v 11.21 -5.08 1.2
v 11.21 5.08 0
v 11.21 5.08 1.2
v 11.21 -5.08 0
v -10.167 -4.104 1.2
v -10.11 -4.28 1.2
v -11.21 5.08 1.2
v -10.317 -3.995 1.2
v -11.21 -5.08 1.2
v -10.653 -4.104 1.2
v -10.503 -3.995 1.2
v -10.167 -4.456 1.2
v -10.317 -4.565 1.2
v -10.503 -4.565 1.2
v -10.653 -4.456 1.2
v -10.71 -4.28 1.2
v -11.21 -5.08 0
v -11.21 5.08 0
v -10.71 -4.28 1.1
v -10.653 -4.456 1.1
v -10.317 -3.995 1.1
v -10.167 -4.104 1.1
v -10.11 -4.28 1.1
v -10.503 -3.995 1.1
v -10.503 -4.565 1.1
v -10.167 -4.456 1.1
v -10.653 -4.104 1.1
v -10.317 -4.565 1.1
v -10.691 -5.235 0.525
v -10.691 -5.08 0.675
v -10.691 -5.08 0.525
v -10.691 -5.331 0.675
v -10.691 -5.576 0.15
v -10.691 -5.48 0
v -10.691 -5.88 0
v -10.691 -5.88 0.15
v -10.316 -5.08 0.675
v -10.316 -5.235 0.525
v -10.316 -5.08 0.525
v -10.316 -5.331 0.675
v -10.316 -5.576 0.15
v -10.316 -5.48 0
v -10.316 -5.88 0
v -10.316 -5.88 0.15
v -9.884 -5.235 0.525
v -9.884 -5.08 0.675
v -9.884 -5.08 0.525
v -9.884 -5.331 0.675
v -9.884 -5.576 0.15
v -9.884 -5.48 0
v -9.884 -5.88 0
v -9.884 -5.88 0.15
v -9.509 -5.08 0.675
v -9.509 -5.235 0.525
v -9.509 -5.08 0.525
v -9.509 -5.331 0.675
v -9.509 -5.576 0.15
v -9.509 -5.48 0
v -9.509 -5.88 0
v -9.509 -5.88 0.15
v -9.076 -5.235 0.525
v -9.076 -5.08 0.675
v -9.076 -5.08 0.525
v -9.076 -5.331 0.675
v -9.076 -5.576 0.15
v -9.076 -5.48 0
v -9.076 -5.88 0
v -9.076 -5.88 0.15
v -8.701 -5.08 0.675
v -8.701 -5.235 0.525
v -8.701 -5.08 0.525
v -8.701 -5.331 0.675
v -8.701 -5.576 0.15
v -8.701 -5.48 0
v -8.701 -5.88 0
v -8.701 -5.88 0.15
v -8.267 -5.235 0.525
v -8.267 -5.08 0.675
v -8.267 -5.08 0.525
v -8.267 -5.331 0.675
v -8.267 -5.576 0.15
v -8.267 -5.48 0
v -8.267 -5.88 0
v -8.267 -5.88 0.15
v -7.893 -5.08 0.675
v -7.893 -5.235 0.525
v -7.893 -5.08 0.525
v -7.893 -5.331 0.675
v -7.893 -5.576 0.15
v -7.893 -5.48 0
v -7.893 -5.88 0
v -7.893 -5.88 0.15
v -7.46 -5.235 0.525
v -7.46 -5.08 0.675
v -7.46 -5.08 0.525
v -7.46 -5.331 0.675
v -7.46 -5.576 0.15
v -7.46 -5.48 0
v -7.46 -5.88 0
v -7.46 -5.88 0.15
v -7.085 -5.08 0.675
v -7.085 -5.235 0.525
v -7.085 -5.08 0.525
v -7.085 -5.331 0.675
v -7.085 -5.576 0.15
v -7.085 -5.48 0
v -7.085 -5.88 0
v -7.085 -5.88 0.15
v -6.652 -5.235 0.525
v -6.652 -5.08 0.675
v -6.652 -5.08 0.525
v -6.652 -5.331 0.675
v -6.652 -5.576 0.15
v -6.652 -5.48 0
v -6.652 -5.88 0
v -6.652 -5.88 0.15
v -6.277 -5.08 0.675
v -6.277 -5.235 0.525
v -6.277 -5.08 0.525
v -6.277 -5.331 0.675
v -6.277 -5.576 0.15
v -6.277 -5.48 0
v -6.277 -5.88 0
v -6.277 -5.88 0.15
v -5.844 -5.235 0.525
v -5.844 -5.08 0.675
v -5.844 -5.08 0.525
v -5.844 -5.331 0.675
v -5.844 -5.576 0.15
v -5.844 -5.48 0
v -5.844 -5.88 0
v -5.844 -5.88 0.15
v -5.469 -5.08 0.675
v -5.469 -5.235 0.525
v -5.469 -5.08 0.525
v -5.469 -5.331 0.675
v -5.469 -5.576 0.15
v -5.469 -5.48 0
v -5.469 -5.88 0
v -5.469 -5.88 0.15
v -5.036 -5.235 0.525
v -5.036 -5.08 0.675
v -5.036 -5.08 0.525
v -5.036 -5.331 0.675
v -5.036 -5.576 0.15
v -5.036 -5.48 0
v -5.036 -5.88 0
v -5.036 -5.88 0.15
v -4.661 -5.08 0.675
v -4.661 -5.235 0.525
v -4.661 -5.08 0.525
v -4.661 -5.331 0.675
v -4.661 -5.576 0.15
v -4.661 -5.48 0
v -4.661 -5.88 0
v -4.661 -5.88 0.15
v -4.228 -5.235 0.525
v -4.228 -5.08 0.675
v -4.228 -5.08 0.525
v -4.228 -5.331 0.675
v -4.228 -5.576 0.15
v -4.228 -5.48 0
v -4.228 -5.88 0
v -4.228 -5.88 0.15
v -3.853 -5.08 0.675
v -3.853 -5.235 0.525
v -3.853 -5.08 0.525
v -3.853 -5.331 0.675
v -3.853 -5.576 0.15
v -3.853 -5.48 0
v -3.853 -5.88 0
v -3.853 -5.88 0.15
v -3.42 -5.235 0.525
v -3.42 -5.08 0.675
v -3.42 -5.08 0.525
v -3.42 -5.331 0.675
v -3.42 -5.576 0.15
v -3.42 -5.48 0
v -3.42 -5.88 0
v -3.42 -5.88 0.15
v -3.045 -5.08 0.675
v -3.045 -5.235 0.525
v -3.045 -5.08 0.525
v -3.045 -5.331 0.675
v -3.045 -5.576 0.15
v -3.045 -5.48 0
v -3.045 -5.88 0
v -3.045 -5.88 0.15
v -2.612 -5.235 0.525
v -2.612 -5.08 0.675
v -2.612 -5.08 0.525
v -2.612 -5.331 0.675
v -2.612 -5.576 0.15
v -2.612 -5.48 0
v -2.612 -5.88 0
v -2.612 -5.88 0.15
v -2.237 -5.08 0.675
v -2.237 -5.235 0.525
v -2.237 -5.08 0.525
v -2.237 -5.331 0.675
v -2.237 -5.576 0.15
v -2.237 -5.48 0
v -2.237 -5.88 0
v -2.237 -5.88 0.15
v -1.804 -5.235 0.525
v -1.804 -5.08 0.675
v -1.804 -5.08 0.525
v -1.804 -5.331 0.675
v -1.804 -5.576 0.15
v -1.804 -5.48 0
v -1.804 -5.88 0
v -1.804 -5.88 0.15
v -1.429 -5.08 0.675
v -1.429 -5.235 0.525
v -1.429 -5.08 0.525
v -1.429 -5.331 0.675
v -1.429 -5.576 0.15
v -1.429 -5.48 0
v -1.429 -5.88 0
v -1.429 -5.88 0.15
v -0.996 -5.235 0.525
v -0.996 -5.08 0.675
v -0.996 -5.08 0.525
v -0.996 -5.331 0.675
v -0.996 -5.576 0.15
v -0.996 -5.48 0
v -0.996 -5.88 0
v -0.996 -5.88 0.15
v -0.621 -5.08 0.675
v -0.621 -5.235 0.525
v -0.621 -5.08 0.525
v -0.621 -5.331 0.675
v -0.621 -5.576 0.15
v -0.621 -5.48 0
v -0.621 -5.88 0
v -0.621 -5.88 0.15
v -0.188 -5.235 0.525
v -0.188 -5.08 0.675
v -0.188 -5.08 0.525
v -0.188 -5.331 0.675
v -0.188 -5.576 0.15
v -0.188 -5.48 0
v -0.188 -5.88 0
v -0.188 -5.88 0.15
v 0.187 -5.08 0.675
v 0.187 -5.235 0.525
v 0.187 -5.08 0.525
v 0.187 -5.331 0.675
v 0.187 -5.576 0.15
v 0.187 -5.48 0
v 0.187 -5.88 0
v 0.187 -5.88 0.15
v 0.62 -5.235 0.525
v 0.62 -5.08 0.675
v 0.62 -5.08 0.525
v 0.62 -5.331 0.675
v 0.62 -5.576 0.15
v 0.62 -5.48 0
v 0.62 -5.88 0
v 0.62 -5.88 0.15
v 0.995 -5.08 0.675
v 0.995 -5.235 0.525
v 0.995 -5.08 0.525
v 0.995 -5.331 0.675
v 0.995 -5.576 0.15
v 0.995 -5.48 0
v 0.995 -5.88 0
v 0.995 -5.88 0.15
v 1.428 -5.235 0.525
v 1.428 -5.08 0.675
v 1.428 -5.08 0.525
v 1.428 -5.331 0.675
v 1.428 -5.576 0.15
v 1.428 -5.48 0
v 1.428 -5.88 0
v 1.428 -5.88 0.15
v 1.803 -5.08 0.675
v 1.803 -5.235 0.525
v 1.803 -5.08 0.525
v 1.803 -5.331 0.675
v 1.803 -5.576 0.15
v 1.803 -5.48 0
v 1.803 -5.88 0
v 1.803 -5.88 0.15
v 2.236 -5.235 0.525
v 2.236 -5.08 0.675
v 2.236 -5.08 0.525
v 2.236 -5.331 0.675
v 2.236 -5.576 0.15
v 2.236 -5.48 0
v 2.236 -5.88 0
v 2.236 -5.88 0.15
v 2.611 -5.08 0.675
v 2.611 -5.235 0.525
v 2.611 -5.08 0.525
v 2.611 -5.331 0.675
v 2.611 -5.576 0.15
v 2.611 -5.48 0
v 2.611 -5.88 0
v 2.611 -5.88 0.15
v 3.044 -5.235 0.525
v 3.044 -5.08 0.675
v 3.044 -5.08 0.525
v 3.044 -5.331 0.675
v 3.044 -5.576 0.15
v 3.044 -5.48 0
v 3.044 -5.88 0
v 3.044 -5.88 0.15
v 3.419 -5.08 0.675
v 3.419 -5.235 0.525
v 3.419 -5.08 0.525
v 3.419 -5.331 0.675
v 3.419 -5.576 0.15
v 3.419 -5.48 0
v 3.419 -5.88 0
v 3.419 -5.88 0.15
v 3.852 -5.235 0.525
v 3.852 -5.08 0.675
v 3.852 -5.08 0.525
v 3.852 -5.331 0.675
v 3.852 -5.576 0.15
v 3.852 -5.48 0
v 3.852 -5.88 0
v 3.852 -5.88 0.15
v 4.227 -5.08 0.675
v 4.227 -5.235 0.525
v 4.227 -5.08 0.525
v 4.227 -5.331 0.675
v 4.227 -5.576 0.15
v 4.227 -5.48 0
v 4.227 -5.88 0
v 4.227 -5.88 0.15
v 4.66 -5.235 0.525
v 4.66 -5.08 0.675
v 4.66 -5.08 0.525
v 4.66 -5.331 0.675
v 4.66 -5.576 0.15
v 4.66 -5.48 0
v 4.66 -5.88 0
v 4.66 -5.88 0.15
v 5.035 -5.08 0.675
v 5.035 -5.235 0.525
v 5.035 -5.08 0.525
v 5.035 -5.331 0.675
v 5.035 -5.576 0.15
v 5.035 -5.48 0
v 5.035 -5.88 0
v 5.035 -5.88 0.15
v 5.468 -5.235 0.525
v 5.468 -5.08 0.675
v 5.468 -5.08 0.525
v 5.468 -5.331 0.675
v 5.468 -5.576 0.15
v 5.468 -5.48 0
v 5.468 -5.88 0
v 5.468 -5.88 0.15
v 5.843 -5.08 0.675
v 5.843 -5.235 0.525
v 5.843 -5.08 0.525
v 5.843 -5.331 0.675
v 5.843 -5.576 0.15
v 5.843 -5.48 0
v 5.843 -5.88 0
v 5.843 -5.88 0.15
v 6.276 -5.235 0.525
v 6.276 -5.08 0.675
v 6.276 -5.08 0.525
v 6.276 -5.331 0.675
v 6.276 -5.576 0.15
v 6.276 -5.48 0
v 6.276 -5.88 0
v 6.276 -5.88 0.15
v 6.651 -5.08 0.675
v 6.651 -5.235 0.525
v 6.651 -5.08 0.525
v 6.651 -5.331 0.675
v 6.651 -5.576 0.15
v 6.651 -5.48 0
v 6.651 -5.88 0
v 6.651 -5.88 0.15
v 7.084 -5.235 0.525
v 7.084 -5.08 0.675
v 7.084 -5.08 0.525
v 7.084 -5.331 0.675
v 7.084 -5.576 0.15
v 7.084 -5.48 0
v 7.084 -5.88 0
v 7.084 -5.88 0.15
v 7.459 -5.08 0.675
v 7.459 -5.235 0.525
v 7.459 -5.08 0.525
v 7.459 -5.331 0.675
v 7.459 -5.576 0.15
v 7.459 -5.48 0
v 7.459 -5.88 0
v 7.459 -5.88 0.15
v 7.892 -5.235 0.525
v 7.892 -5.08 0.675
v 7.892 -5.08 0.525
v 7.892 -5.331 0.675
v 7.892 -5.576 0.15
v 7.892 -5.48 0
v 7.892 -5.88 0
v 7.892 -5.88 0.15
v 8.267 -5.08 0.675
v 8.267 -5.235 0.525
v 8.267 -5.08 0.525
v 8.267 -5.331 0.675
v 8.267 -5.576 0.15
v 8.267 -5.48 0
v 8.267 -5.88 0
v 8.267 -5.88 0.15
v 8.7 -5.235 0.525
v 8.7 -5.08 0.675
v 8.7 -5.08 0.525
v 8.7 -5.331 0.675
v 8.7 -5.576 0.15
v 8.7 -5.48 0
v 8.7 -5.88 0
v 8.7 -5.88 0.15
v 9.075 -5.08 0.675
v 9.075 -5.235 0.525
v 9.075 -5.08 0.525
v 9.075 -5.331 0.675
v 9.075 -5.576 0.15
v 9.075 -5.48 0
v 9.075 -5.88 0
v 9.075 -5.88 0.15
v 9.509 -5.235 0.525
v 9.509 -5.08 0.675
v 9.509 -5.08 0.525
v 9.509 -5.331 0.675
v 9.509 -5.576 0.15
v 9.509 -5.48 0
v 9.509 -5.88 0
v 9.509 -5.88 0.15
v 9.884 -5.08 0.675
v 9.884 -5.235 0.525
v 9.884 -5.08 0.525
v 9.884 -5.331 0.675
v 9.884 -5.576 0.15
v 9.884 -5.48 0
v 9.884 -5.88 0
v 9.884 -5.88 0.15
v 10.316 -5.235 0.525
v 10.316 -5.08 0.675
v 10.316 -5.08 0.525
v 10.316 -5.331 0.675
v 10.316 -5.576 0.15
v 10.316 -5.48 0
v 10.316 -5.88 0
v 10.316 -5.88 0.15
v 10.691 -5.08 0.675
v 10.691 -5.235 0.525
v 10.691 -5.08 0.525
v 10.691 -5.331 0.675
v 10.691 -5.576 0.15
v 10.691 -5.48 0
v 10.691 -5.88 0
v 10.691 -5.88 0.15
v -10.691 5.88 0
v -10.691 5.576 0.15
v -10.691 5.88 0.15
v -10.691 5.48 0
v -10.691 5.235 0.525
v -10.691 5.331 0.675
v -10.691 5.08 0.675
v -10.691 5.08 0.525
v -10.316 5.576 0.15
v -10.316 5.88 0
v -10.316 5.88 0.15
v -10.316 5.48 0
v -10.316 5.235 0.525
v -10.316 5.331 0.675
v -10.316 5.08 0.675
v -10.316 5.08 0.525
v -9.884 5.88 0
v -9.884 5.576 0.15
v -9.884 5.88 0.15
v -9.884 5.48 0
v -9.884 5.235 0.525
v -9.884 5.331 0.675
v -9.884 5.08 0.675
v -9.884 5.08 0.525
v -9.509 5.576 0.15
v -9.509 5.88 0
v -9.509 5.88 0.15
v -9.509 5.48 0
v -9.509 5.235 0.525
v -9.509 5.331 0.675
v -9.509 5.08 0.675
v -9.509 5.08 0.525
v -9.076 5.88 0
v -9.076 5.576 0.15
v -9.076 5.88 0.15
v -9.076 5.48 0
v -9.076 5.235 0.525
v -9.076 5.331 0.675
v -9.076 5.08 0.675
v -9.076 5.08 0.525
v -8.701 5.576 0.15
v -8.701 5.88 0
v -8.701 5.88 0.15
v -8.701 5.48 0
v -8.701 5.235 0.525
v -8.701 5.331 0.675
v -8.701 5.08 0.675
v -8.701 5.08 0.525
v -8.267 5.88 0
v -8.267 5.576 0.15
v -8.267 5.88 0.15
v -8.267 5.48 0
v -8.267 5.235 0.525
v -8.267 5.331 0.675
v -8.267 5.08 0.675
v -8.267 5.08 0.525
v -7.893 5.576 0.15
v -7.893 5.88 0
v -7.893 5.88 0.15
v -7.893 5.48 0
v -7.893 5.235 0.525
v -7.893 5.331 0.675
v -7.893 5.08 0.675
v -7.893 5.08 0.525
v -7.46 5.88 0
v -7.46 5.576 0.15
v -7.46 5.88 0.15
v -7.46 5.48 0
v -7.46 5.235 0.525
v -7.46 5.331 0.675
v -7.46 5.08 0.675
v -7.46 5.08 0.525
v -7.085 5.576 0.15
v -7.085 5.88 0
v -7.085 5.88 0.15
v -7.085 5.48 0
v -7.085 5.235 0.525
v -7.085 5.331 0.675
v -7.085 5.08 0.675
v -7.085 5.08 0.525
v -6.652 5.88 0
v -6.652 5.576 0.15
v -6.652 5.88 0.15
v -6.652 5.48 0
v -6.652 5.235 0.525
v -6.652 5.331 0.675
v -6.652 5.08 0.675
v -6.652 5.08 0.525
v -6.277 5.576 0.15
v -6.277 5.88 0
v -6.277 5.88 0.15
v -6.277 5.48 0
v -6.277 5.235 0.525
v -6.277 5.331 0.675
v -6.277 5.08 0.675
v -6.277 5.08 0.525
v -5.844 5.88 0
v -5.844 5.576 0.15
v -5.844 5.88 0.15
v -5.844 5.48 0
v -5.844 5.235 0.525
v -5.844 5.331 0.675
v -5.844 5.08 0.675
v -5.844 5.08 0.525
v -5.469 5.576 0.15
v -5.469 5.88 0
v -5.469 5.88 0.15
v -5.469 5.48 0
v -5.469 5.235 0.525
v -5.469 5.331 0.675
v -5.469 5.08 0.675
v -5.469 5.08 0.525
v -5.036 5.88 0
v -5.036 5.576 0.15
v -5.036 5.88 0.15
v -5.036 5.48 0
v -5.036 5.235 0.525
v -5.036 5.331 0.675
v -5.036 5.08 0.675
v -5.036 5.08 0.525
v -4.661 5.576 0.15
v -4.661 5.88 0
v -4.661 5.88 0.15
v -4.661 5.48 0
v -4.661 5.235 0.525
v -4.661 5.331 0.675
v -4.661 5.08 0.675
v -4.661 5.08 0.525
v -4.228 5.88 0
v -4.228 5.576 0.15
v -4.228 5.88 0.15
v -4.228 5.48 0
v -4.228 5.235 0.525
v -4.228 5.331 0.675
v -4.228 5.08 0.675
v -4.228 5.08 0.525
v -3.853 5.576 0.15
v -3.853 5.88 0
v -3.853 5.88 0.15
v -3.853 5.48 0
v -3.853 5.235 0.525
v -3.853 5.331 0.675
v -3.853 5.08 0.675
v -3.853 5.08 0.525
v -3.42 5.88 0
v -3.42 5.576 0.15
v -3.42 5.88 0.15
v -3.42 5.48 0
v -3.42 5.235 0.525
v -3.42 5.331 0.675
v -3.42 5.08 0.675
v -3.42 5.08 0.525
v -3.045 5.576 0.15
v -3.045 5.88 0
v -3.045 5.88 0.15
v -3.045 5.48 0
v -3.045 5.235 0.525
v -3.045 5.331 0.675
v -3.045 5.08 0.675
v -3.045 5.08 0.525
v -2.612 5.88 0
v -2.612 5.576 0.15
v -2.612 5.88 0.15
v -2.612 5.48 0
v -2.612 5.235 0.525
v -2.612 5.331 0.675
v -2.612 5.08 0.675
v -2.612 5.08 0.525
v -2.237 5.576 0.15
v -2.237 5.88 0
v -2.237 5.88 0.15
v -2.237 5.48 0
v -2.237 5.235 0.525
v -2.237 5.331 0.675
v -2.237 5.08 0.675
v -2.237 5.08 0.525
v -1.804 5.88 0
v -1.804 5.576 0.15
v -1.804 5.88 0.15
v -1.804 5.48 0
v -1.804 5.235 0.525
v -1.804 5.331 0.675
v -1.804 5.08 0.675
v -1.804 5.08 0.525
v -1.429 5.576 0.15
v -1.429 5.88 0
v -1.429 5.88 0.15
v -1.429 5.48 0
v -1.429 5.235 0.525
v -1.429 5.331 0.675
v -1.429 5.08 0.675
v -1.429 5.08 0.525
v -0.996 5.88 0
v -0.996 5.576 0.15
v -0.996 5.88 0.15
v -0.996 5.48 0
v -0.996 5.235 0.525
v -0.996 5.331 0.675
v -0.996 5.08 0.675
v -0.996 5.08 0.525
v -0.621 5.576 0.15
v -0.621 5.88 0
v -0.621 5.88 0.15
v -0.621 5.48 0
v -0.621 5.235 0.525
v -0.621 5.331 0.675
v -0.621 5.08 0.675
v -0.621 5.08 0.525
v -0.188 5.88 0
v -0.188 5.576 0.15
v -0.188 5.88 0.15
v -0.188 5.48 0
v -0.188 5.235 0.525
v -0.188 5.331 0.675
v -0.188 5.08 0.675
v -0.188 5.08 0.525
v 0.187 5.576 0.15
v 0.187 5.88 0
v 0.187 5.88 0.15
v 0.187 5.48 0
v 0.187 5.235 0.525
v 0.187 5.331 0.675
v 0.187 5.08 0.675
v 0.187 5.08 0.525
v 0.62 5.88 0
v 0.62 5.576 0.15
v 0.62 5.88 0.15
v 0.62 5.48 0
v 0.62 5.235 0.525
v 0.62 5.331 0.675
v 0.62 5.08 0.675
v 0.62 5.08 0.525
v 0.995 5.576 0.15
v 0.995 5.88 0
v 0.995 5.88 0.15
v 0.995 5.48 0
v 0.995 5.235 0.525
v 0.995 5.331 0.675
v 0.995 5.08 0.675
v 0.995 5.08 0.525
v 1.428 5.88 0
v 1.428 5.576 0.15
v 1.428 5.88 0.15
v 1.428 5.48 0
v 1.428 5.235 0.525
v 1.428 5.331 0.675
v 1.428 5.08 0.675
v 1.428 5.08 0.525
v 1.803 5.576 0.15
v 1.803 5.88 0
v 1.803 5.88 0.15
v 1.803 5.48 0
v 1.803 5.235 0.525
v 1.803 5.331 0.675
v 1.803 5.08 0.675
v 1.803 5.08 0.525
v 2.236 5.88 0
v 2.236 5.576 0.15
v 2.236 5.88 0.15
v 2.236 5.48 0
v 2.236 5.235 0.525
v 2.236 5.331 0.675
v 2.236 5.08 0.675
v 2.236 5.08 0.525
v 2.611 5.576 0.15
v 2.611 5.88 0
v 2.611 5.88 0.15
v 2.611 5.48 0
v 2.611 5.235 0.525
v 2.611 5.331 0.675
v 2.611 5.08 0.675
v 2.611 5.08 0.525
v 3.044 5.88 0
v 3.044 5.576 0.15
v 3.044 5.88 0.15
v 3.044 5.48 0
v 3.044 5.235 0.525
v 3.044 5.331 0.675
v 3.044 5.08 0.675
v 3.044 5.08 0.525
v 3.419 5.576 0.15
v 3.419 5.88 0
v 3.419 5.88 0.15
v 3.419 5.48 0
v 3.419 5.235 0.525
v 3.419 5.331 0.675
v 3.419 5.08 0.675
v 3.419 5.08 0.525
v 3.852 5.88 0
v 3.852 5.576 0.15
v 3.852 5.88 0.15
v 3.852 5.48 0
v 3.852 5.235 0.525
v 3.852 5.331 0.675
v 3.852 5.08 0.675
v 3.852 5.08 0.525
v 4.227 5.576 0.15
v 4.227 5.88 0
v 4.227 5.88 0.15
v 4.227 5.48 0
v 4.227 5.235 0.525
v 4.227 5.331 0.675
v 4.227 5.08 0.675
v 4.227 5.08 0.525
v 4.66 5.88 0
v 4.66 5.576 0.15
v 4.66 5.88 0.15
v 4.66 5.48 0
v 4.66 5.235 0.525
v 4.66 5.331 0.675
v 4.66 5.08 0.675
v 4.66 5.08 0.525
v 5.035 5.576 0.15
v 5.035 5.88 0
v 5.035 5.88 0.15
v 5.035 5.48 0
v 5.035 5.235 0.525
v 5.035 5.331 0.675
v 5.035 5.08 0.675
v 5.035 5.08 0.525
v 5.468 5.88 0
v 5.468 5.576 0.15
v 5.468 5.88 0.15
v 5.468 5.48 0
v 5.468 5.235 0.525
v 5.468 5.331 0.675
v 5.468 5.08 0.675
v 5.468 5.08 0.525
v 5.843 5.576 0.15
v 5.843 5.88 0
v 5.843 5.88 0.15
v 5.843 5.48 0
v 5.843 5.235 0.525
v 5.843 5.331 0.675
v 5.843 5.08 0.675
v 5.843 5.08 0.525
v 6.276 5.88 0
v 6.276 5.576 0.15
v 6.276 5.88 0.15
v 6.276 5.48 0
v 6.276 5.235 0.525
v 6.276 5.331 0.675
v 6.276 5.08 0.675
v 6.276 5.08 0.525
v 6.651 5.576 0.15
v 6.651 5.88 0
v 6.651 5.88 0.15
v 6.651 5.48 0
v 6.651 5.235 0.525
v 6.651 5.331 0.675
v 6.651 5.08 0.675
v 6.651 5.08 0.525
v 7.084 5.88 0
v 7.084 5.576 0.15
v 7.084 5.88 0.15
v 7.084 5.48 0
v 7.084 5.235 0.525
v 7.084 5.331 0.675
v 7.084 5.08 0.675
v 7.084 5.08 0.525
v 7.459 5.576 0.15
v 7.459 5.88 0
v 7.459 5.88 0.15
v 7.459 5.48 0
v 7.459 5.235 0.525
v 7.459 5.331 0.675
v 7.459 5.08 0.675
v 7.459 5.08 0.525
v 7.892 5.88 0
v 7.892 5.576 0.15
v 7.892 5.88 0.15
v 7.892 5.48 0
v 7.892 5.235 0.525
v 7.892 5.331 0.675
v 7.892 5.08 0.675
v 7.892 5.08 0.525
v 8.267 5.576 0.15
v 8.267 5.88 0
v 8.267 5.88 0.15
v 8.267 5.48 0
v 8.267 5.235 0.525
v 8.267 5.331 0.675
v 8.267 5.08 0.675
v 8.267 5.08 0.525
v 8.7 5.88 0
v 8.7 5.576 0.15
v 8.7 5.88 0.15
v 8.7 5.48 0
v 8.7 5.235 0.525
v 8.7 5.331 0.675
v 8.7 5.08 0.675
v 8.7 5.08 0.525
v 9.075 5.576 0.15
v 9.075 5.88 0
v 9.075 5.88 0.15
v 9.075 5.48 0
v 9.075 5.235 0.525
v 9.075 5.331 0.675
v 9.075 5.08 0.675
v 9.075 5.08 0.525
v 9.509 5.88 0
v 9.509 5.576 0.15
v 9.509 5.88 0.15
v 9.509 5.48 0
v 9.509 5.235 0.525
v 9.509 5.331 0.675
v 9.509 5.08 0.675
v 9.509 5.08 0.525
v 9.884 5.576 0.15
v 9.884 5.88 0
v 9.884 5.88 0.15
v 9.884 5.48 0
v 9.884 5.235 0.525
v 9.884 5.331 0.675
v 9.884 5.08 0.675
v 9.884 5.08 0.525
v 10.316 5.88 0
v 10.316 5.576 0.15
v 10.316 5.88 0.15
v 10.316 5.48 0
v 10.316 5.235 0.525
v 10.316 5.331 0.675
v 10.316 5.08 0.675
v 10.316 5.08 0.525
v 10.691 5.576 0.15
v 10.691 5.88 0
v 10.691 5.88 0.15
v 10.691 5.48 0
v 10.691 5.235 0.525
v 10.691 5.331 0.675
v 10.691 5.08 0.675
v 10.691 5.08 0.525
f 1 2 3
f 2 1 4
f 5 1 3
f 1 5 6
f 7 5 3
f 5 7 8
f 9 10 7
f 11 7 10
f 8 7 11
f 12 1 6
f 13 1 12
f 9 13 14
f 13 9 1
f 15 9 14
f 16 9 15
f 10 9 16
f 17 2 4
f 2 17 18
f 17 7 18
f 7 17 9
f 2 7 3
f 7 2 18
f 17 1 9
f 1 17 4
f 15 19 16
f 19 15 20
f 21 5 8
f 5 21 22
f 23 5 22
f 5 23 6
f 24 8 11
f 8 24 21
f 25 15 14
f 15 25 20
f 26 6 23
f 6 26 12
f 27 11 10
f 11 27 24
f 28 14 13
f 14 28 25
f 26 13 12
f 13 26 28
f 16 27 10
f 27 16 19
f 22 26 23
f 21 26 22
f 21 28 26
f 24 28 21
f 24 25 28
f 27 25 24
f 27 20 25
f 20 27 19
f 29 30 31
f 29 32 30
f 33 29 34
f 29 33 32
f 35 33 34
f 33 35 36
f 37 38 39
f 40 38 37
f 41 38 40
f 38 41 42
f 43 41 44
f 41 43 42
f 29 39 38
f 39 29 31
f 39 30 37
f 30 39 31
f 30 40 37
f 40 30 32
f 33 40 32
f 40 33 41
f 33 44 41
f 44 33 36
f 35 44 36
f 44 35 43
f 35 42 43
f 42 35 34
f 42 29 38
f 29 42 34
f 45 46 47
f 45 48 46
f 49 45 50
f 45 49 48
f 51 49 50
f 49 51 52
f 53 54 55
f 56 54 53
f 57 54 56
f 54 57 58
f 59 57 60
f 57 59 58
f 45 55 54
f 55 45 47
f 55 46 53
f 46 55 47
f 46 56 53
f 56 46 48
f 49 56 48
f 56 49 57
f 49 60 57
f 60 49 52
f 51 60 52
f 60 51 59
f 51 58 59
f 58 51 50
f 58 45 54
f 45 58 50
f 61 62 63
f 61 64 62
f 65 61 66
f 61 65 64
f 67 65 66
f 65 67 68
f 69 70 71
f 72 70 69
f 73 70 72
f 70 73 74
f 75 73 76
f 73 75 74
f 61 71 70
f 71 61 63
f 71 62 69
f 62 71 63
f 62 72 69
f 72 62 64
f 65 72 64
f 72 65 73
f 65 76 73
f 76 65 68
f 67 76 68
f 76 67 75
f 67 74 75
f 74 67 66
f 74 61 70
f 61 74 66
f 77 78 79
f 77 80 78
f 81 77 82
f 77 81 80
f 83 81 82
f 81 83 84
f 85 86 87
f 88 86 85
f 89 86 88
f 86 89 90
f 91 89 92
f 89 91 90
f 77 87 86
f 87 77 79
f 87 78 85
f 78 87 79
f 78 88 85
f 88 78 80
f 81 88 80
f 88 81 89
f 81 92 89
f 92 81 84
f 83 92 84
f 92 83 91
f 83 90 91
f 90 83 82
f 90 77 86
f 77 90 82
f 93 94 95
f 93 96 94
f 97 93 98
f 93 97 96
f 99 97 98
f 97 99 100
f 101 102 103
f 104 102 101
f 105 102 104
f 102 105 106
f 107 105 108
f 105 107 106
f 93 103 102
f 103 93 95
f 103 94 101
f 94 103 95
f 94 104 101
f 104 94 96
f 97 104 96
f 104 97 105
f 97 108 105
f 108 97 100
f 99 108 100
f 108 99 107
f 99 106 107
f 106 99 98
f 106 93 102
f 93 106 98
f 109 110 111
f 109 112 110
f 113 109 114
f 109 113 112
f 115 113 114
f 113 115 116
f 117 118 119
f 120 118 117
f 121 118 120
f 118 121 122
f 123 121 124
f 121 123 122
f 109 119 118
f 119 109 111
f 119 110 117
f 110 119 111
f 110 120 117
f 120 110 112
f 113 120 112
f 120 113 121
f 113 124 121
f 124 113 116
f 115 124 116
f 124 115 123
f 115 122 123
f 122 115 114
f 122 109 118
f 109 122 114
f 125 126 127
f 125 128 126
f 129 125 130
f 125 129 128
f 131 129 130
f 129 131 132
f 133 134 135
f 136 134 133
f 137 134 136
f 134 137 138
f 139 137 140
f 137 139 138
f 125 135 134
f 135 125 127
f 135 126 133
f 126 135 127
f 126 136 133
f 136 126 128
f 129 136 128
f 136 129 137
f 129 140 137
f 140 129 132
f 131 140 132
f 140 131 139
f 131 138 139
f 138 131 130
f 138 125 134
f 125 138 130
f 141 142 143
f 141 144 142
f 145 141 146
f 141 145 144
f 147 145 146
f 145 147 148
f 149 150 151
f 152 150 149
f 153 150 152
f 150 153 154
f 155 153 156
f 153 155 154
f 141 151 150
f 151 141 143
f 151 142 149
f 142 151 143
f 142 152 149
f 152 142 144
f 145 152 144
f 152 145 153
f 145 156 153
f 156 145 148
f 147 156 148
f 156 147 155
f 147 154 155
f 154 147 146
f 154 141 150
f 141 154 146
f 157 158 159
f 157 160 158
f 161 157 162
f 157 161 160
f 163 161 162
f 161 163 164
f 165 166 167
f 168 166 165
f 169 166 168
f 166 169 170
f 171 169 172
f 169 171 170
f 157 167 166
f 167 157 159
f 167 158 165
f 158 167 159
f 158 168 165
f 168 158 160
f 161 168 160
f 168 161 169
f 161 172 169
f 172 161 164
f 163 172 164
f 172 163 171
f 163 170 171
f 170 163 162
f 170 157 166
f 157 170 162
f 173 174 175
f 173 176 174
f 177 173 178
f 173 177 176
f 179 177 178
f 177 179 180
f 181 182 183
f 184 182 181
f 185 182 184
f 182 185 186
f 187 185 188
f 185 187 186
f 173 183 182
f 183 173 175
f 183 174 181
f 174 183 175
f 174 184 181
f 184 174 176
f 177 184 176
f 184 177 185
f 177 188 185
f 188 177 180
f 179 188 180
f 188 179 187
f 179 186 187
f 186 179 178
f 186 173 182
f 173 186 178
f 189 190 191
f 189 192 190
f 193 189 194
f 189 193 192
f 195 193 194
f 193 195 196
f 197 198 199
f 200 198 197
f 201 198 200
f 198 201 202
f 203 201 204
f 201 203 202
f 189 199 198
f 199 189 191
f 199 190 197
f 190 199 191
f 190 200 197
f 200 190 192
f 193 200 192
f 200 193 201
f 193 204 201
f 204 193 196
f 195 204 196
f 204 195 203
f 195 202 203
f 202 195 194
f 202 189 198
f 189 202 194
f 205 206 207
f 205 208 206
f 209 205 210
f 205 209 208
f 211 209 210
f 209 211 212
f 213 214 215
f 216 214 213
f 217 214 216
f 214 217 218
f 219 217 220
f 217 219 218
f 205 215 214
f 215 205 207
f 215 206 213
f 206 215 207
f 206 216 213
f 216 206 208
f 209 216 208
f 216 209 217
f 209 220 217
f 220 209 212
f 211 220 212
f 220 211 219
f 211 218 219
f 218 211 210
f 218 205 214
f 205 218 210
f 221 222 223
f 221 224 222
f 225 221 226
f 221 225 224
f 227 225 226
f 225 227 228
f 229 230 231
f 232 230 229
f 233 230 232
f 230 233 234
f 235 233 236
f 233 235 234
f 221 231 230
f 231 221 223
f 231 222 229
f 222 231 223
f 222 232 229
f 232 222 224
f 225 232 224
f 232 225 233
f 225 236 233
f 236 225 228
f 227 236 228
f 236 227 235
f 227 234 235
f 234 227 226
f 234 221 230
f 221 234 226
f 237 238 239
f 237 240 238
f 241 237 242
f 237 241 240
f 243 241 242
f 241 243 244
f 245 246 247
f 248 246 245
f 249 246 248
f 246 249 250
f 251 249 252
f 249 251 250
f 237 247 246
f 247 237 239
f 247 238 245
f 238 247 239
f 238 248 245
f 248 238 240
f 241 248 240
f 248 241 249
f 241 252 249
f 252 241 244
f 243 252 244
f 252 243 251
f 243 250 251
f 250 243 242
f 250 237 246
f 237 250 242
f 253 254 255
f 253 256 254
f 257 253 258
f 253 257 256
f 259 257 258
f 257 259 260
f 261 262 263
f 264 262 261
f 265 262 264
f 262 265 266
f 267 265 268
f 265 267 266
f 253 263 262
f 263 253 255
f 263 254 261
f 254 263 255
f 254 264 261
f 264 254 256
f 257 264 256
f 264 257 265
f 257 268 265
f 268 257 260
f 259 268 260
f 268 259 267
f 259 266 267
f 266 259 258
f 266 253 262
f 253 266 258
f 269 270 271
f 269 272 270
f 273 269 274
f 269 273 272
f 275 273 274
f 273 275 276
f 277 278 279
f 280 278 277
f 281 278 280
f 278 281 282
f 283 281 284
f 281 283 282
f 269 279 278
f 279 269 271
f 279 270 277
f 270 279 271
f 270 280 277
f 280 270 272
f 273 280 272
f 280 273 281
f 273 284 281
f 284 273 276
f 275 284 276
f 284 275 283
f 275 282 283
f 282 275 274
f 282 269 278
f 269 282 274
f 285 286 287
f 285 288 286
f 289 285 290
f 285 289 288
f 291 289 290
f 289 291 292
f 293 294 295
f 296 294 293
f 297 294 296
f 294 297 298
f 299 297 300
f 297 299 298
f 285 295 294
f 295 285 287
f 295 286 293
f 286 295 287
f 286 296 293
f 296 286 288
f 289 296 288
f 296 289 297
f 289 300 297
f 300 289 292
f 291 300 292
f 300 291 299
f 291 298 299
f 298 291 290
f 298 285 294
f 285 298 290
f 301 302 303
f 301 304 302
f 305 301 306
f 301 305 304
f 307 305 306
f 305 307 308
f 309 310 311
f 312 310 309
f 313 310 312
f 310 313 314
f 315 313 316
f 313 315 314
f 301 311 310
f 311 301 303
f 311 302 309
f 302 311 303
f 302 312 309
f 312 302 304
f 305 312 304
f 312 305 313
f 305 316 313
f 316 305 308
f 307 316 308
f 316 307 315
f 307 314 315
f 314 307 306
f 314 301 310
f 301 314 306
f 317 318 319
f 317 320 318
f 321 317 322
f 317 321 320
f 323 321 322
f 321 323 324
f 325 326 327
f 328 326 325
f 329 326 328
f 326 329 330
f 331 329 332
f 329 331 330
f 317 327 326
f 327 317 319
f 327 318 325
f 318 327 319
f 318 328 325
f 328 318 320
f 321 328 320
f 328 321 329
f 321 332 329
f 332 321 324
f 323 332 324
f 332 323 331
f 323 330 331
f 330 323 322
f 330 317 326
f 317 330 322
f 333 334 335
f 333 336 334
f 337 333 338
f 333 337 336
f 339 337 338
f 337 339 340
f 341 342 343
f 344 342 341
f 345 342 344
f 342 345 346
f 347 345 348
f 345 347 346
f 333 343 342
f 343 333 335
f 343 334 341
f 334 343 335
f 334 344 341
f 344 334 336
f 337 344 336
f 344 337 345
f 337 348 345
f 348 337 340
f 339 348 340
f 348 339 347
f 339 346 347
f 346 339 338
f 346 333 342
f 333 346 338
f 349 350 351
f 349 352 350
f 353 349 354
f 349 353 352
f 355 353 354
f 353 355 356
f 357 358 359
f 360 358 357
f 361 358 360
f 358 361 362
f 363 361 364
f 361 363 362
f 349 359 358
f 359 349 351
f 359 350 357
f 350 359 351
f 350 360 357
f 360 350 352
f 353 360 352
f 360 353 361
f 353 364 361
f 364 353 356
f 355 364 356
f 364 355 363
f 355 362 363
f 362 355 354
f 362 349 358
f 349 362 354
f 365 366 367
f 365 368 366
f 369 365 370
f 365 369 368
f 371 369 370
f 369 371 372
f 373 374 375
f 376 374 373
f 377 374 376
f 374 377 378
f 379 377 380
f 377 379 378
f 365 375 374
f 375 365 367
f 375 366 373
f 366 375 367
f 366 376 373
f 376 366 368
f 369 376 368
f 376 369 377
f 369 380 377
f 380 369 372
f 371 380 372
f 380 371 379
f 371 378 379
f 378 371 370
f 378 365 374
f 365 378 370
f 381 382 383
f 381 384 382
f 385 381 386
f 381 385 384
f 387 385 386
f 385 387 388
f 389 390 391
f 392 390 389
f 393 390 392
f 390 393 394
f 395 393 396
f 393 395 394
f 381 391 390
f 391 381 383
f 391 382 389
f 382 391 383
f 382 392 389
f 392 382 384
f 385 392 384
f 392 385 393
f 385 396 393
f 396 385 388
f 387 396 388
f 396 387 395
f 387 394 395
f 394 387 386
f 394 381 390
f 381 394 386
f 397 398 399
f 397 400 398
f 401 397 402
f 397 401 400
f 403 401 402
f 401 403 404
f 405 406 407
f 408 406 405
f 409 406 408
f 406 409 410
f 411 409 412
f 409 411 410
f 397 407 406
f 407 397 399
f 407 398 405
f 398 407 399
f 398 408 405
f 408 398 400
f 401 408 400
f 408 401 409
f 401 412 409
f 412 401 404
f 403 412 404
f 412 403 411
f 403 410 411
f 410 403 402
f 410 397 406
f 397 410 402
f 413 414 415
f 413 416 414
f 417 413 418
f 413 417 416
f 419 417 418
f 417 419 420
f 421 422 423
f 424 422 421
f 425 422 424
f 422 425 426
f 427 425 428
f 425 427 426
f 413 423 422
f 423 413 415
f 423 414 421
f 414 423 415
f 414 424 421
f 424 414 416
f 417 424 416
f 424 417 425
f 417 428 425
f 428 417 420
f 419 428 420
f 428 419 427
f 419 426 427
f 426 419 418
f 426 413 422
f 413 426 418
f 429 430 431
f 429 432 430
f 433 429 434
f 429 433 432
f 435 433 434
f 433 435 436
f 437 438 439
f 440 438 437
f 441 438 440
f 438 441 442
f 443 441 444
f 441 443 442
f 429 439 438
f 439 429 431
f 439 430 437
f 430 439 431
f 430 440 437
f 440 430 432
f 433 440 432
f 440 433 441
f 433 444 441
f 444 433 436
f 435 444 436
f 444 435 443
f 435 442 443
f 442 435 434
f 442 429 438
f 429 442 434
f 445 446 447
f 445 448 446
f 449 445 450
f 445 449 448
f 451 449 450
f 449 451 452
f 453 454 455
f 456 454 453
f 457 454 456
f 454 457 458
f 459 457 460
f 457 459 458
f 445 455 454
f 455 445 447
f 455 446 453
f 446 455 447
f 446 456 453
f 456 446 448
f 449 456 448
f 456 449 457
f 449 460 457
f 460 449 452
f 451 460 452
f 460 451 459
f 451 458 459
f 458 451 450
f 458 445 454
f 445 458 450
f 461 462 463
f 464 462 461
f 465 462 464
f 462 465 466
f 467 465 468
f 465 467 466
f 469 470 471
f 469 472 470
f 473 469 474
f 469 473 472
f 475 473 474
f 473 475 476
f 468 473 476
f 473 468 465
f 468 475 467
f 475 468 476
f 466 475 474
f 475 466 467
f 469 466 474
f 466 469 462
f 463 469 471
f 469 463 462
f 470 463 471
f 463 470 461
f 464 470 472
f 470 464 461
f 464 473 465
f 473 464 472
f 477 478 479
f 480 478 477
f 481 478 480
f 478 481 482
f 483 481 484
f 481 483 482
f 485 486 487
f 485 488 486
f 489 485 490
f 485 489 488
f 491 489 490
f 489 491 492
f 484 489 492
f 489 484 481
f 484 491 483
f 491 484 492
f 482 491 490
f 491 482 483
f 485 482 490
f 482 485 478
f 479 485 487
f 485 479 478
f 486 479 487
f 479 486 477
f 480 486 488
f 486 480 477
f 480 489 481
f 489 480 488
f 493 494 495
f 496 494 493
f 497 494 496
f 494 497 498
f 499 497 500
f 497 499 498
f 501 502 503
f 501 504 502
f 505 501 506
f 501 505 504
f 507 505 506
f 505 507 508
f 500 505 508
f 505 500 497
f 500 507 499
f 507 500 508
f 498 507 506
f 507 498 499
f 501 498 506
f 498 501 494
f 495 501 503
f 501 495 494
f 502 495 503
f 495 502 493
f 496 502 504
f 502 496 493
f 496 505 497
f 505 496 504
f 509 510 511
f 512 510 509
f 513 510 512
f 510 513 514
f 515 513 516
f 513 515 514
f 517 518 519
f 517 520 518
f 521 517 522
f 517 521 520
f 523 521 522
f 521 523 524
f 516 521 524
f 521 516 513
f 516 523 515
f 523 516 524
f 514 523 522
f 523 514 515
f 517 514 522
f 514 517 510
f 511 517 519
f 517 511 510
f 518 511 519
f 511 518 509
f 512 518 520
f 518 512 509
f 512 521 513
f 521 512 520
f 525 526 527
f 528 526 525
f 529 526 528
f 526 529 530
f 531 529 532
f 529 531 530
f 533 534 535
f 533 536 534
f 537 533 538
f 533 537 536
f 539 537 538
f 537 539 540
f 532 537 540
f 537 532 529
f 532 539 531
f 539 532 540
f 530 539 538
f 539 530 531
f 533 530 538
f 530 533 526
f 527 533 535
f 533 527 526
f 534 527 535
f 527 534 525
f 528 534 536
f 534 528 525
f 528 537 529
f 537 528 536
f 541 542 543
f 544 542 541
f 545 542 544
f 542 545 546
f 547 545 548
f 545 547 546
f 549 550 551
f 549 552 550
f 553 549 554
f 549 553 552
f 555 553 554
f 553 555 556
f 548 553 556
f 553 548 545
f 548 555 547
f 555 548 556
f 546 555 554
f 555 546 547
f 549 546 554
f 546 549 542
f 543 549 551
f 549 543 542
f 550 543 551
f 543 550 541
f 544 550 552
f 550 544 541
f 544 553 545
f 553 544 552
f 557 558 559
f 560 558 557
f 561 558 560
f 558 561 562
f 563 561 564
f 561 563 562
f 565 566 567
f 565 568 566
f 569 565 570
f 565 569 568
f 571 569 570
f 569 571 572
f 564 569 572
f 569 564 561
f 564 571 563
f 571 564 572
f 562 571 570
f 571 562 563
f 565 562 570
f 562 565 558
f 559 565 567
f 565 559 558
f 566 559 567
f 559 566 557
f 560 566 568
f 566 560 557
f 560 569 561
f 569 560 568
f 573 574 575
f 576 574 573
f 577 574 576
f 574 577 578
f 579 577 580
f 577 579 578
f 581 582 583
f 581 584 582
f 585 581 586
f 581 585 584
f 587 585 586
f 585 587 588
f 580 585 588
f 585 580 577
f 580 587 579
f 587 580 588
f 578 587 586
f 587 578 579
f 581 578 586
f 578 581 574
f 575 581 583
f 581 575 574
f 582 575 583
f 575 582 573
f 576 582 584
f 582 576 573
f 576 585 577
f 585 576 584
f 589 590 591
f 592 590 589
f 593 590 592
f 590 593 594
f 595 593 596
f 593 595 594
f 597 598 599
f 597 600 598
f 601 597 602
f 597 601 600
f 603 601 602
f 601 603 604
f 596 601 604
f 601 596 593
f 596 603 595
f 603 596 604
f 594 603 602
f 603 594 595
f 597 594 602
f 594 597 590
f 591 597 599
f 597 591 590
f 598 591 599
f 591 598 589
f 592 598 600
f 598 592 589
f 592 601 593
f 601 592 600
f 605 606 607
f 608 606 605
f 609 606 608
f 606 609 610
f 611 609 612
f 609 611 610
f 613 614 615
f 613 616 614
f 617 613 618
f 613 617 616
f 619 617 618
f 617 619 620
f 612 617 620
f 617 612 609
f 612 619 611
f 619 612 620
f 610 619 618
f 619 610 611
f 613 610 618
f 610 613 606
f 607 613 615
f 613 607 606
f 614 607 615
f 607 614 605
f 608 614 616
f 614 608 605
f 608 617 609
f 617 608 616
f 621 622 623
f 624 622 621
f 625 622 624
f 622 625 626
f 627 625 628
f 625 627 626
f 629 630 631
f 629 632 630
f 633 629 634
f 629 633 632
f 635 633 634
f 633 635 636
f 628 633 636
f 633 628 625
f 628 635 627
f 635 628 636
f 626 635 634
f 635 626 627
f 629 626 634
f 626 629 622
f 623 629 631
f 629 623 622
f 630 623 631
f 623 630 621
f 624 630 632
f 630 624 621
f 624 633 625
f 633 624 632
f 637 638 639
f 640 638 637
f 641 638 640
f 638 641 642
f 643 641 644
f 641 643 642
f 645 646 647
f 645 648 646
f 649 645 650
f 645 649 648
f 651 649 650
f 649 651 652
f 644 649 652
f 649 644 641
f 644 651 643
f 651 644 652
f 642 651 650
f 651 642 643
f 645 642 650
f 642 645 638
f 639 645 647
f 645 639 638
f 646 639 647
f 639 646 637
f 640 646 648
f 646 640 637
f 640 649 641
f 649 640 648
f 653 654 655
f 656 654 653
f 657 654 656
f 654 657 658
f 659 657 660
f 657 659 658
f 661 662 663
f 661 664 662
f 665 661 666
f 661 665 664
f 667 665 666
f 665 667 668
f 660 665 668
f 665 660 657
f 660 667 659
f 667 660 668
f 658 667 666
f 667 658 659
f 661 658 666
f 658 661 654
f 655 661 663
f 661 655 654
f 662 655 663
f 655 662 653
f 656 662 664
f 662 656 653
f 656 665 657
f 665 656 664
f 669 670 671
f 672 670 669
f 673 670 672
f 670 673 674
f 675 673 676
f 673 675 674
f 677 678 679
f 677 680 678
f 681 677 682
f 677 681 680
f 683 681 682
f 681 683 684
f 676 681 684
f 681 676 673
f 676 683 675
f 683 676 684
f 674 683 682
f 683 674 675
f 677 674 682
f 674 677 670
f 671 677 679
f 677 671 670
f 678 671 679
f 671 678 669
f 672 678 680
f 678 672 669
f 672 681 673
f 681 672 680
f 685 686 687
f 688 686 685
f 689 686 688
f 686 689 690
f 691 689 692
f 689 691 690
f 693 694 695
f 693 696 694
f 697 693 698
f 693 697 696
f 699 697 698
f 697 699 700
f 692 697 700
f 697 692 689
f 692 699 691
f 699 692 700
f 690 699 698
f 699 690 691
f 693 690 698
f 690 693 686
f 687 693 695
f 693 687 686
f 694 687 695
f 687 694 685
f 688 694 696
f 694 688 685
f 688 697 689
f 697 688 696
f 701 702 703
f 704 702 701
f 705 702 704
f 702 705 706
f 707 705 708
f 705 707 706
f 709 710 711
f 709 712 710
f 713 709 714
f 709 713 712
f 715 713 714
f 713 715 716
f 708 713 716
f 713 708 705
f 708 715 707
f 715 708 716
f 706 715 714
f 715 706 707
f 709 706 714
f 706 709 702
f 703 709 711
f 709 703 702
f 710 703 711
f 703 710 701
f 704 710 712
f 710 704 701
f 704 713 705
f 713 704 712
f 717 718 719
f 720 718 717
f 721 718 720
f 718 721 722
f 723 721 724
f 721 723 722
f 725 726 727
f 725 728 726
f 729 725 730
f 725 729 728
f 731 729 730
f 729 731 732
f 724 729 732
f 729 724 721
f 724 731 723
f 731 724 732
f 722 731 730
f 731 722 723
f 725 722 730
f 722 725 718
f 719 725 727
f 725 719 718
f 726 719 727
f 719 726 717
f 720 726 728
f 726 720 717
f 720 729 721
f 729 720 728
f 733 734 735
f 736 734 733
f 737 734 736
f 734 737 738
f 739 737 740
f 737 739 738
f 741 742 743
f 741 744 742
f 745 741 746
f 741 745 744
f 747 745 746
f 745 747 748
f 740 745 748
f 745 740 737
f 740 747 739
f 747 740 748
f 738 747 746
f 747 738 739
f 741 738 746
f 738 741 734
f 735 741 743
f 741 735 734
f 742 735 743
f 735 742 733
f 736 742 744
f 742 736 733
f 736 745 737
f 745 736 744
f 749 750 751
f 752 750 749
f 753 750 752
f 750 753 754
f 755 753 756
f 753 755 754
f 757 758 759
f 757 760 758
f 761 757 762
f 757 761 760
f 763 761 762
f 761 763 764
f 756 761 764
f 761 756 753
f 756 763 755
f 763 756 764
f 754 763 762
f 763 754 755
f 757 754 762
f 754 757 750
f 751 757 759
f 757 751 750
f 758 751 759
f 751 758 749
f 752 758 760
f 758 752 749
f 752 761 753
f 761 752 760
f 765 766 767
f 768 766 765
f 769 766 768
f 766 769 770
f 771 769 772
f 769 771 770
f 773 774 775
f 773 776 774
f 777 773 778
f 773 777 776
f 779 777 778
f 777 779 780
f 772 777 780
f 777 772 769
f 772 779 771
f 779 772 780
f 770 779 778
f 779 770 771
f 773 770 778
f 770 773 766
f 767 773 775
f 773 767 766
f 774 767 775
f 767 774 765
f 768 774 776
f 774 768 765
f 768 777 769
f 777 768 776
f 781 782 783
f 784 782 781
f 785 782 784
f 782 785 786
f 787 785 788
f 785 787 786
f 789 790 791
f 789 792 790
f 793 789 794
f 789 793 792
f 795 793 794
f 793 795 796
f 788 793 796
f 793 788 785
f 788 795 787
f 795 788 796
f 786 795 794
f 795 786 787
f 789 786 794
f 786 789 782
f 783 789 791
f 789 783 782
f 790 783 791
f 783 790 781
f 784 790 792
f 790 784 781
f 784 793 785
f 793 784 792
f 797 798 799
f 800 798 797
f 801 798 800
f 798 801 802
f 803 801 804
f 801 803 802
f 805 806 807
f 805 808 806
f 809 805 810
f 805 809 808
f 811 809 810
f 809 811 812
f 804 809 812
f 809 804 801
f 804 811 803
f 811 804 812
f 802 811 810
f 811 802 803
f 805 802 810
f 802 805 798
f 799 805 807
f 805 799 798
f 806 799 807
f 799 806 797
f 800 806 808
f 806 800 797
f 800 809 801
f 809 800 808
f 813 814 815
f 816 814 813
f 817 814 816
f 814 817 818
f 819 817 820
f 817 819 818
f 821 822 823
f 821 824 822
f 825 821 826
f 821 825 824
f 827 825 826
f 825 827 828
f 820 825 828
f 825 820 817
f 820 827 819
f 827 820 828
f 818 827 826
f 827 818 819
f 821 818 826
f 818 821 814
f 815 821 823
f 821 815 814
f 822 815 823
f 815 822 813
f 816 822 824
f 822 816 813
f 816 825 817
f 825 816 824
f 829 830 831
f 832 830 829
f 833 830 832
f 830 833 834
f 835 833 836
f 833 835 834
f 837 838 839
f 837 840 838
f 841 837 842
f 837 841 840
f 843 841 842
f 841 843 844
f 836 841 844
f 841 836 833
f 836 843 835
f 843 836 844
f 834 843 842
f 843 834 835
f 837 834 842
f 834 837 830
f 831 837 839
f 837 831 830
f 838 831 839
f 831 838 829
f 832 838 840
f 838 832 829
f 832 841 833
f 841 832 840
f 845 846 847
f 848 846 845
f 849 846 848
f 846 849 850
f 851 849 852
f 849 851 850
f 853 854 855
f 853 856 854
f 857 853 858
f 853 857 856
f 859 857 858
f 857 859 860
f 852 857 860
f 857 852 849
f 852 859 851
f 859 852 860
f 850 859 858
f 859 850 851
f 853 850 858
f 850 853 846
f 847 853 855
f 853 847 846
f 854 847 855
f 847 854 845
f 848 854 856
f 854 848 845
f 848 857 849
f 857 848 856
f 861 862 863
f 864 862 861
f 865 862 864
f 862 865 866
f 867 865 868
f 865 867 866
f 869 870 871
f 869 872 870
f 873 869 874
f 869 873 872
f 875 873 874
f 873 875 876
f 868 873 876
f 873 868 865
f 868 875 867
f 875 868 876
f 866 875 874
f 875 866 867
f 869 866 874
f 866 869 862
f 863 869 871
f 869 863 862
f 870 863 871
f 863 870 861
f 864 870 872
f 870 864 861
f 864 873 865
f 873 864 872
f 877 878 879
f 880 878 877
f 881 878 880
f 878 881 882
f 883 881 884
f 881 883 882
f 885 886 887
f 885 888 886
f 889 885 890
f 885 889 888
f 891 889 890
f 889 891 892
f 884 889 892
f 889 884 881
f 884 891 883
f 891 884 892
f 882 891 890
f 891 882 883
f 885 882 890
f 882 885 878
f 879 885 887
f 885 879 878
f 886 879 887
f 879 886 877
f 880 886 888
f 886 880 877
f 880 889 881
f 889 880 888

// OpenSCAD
// Case dimensions
case_x=22.42;        // Case X dimension
case_y=10.16;        // Case Y dimension
case_z=1.2;        // Case Z dimension
dot_radius=0.3; // Notch radius
dot_depth=0.1;  // Notch depth
dot_off_x=0.5;  // Notch offset X
dot_off_y=0.5;  // Notch offset Y
color_case=[0.15,0.15,0.15]; // dark gray
color_dot=[1,1,1]; // white

// Pin arrays parameters
side1_pins = 27;
side2_pins = 0;
side3_pins = 27;
side4_pins = 0;
pin_distance =0.808;    // Pin step
color_pin=[1,1,1]; // white

// Pin parameters
pin_th = 0.15; // Thickness
pin_W = 0.375;  // Pin width
pin_L = 0.8;  // Total Length
pin_H = case_z/2+pin_th/2; // Pin height (from bottom to top)
pin_l = 0.4;  // Length of the bottom part
pin_a = 115;  // Bending angle

translate_to_center=[-(side1_pins-1)*pin_distance/2,-(case_y+pin_L*2)/2,0];

// Bended pin
// _L - whole pin length
// _l - length of bottom part
// _H - whole pin height
// _th - pin thickness
// _a - bending angle
// _W - pin width
module pin(_L,_l,_H,_th,_a,_W)
{
    // Internal variables
    _d1 = _th*sin(_a) / (1-cos(_a));
    _d2 = (_th-_H)*cos(_a) / sin(_a);

    rotate([90,0,90])
    // Extrude the following polygon
    linear_extrude(height = _W, center = true, convexity = 10, twist = 0)
        polygon([[0,0],
                 [_l,0],
                 [_l+_d2,_H-_th],
                 [_L,_H-_th],
                 [_L,_H],
                 [_l+_d2-_d1,_H],
                 [_l-_d1,_th],
                 [0,_th]]);
}

// Array of pins
// _cnt - number of pins
// _distance - distance between pin centres
module pins_array(_cnt, _distance)
{
    if (_cnt>0)
    color(color_pin)
    {
        for (_i = [0:_cnt-1])
        {
            translate([_distance*_i,0,0])
                pin(pin_L,pin_l,pin_H,pin_th,pin_a,pin_W);
        }
    }
}

// Simple case with notch
module case()
{
    difference()
    {
        translate([case_x/2,case_y/2,case_z/2])
        color(color_case)
          cube([case_x,case_y,case_z],center=true);
        translate([dot_radius+dot_off_x,dot_radius+dot_off_y,case_z])
          color(color_dot)
            cylinder(h=dot_depth*2, r = dot_radius, center= true, $fn = 10);
    }
}


// Complete model
// scale(1/2.54) // 1/2.54=0.3937 scale for Kicad
module ic()
{
  // Case
  translate([-(case_x-(side1_pins-1)*pin_distance)/2,pin_L,0]+translate_to_center)
      case();

  translate(translate_to_center)
  union()
  {
    // Top pins
    translate([(side1_pins-side3_pins)*pin_distance/2,case_y+pin_L*2,0])
        mirror([0,1,0])
            pins_array(side3_pins, pin_distance);

    // Bottom pins
    pins_array(side1_pins, pin_distance);

    // Left pins
    translate([-(case_x-(side1_pins-1)*pin_distance)/2 - pin_L,pin_L+case_y/2-(side4_pins-1)*pin_distance/2,0])
        mirror([1,0,0])
            rotate([0,0,90])
                pins_array(side4_pins, pin_distance);

    // Right pins
    translate([-(case_x-(side1_pins-1)*pin_distance)/2-pin_L+case_x+2*pin_L,pin_L+case_y/2-(side2_pins-1)*pin_distance/2,0])
        mirror([0,1,0])
            mirror([0,1,0])
                rotate([0,0,90])
                    pins_array(side2_pins, pin_distance);
    }
}

ic();
